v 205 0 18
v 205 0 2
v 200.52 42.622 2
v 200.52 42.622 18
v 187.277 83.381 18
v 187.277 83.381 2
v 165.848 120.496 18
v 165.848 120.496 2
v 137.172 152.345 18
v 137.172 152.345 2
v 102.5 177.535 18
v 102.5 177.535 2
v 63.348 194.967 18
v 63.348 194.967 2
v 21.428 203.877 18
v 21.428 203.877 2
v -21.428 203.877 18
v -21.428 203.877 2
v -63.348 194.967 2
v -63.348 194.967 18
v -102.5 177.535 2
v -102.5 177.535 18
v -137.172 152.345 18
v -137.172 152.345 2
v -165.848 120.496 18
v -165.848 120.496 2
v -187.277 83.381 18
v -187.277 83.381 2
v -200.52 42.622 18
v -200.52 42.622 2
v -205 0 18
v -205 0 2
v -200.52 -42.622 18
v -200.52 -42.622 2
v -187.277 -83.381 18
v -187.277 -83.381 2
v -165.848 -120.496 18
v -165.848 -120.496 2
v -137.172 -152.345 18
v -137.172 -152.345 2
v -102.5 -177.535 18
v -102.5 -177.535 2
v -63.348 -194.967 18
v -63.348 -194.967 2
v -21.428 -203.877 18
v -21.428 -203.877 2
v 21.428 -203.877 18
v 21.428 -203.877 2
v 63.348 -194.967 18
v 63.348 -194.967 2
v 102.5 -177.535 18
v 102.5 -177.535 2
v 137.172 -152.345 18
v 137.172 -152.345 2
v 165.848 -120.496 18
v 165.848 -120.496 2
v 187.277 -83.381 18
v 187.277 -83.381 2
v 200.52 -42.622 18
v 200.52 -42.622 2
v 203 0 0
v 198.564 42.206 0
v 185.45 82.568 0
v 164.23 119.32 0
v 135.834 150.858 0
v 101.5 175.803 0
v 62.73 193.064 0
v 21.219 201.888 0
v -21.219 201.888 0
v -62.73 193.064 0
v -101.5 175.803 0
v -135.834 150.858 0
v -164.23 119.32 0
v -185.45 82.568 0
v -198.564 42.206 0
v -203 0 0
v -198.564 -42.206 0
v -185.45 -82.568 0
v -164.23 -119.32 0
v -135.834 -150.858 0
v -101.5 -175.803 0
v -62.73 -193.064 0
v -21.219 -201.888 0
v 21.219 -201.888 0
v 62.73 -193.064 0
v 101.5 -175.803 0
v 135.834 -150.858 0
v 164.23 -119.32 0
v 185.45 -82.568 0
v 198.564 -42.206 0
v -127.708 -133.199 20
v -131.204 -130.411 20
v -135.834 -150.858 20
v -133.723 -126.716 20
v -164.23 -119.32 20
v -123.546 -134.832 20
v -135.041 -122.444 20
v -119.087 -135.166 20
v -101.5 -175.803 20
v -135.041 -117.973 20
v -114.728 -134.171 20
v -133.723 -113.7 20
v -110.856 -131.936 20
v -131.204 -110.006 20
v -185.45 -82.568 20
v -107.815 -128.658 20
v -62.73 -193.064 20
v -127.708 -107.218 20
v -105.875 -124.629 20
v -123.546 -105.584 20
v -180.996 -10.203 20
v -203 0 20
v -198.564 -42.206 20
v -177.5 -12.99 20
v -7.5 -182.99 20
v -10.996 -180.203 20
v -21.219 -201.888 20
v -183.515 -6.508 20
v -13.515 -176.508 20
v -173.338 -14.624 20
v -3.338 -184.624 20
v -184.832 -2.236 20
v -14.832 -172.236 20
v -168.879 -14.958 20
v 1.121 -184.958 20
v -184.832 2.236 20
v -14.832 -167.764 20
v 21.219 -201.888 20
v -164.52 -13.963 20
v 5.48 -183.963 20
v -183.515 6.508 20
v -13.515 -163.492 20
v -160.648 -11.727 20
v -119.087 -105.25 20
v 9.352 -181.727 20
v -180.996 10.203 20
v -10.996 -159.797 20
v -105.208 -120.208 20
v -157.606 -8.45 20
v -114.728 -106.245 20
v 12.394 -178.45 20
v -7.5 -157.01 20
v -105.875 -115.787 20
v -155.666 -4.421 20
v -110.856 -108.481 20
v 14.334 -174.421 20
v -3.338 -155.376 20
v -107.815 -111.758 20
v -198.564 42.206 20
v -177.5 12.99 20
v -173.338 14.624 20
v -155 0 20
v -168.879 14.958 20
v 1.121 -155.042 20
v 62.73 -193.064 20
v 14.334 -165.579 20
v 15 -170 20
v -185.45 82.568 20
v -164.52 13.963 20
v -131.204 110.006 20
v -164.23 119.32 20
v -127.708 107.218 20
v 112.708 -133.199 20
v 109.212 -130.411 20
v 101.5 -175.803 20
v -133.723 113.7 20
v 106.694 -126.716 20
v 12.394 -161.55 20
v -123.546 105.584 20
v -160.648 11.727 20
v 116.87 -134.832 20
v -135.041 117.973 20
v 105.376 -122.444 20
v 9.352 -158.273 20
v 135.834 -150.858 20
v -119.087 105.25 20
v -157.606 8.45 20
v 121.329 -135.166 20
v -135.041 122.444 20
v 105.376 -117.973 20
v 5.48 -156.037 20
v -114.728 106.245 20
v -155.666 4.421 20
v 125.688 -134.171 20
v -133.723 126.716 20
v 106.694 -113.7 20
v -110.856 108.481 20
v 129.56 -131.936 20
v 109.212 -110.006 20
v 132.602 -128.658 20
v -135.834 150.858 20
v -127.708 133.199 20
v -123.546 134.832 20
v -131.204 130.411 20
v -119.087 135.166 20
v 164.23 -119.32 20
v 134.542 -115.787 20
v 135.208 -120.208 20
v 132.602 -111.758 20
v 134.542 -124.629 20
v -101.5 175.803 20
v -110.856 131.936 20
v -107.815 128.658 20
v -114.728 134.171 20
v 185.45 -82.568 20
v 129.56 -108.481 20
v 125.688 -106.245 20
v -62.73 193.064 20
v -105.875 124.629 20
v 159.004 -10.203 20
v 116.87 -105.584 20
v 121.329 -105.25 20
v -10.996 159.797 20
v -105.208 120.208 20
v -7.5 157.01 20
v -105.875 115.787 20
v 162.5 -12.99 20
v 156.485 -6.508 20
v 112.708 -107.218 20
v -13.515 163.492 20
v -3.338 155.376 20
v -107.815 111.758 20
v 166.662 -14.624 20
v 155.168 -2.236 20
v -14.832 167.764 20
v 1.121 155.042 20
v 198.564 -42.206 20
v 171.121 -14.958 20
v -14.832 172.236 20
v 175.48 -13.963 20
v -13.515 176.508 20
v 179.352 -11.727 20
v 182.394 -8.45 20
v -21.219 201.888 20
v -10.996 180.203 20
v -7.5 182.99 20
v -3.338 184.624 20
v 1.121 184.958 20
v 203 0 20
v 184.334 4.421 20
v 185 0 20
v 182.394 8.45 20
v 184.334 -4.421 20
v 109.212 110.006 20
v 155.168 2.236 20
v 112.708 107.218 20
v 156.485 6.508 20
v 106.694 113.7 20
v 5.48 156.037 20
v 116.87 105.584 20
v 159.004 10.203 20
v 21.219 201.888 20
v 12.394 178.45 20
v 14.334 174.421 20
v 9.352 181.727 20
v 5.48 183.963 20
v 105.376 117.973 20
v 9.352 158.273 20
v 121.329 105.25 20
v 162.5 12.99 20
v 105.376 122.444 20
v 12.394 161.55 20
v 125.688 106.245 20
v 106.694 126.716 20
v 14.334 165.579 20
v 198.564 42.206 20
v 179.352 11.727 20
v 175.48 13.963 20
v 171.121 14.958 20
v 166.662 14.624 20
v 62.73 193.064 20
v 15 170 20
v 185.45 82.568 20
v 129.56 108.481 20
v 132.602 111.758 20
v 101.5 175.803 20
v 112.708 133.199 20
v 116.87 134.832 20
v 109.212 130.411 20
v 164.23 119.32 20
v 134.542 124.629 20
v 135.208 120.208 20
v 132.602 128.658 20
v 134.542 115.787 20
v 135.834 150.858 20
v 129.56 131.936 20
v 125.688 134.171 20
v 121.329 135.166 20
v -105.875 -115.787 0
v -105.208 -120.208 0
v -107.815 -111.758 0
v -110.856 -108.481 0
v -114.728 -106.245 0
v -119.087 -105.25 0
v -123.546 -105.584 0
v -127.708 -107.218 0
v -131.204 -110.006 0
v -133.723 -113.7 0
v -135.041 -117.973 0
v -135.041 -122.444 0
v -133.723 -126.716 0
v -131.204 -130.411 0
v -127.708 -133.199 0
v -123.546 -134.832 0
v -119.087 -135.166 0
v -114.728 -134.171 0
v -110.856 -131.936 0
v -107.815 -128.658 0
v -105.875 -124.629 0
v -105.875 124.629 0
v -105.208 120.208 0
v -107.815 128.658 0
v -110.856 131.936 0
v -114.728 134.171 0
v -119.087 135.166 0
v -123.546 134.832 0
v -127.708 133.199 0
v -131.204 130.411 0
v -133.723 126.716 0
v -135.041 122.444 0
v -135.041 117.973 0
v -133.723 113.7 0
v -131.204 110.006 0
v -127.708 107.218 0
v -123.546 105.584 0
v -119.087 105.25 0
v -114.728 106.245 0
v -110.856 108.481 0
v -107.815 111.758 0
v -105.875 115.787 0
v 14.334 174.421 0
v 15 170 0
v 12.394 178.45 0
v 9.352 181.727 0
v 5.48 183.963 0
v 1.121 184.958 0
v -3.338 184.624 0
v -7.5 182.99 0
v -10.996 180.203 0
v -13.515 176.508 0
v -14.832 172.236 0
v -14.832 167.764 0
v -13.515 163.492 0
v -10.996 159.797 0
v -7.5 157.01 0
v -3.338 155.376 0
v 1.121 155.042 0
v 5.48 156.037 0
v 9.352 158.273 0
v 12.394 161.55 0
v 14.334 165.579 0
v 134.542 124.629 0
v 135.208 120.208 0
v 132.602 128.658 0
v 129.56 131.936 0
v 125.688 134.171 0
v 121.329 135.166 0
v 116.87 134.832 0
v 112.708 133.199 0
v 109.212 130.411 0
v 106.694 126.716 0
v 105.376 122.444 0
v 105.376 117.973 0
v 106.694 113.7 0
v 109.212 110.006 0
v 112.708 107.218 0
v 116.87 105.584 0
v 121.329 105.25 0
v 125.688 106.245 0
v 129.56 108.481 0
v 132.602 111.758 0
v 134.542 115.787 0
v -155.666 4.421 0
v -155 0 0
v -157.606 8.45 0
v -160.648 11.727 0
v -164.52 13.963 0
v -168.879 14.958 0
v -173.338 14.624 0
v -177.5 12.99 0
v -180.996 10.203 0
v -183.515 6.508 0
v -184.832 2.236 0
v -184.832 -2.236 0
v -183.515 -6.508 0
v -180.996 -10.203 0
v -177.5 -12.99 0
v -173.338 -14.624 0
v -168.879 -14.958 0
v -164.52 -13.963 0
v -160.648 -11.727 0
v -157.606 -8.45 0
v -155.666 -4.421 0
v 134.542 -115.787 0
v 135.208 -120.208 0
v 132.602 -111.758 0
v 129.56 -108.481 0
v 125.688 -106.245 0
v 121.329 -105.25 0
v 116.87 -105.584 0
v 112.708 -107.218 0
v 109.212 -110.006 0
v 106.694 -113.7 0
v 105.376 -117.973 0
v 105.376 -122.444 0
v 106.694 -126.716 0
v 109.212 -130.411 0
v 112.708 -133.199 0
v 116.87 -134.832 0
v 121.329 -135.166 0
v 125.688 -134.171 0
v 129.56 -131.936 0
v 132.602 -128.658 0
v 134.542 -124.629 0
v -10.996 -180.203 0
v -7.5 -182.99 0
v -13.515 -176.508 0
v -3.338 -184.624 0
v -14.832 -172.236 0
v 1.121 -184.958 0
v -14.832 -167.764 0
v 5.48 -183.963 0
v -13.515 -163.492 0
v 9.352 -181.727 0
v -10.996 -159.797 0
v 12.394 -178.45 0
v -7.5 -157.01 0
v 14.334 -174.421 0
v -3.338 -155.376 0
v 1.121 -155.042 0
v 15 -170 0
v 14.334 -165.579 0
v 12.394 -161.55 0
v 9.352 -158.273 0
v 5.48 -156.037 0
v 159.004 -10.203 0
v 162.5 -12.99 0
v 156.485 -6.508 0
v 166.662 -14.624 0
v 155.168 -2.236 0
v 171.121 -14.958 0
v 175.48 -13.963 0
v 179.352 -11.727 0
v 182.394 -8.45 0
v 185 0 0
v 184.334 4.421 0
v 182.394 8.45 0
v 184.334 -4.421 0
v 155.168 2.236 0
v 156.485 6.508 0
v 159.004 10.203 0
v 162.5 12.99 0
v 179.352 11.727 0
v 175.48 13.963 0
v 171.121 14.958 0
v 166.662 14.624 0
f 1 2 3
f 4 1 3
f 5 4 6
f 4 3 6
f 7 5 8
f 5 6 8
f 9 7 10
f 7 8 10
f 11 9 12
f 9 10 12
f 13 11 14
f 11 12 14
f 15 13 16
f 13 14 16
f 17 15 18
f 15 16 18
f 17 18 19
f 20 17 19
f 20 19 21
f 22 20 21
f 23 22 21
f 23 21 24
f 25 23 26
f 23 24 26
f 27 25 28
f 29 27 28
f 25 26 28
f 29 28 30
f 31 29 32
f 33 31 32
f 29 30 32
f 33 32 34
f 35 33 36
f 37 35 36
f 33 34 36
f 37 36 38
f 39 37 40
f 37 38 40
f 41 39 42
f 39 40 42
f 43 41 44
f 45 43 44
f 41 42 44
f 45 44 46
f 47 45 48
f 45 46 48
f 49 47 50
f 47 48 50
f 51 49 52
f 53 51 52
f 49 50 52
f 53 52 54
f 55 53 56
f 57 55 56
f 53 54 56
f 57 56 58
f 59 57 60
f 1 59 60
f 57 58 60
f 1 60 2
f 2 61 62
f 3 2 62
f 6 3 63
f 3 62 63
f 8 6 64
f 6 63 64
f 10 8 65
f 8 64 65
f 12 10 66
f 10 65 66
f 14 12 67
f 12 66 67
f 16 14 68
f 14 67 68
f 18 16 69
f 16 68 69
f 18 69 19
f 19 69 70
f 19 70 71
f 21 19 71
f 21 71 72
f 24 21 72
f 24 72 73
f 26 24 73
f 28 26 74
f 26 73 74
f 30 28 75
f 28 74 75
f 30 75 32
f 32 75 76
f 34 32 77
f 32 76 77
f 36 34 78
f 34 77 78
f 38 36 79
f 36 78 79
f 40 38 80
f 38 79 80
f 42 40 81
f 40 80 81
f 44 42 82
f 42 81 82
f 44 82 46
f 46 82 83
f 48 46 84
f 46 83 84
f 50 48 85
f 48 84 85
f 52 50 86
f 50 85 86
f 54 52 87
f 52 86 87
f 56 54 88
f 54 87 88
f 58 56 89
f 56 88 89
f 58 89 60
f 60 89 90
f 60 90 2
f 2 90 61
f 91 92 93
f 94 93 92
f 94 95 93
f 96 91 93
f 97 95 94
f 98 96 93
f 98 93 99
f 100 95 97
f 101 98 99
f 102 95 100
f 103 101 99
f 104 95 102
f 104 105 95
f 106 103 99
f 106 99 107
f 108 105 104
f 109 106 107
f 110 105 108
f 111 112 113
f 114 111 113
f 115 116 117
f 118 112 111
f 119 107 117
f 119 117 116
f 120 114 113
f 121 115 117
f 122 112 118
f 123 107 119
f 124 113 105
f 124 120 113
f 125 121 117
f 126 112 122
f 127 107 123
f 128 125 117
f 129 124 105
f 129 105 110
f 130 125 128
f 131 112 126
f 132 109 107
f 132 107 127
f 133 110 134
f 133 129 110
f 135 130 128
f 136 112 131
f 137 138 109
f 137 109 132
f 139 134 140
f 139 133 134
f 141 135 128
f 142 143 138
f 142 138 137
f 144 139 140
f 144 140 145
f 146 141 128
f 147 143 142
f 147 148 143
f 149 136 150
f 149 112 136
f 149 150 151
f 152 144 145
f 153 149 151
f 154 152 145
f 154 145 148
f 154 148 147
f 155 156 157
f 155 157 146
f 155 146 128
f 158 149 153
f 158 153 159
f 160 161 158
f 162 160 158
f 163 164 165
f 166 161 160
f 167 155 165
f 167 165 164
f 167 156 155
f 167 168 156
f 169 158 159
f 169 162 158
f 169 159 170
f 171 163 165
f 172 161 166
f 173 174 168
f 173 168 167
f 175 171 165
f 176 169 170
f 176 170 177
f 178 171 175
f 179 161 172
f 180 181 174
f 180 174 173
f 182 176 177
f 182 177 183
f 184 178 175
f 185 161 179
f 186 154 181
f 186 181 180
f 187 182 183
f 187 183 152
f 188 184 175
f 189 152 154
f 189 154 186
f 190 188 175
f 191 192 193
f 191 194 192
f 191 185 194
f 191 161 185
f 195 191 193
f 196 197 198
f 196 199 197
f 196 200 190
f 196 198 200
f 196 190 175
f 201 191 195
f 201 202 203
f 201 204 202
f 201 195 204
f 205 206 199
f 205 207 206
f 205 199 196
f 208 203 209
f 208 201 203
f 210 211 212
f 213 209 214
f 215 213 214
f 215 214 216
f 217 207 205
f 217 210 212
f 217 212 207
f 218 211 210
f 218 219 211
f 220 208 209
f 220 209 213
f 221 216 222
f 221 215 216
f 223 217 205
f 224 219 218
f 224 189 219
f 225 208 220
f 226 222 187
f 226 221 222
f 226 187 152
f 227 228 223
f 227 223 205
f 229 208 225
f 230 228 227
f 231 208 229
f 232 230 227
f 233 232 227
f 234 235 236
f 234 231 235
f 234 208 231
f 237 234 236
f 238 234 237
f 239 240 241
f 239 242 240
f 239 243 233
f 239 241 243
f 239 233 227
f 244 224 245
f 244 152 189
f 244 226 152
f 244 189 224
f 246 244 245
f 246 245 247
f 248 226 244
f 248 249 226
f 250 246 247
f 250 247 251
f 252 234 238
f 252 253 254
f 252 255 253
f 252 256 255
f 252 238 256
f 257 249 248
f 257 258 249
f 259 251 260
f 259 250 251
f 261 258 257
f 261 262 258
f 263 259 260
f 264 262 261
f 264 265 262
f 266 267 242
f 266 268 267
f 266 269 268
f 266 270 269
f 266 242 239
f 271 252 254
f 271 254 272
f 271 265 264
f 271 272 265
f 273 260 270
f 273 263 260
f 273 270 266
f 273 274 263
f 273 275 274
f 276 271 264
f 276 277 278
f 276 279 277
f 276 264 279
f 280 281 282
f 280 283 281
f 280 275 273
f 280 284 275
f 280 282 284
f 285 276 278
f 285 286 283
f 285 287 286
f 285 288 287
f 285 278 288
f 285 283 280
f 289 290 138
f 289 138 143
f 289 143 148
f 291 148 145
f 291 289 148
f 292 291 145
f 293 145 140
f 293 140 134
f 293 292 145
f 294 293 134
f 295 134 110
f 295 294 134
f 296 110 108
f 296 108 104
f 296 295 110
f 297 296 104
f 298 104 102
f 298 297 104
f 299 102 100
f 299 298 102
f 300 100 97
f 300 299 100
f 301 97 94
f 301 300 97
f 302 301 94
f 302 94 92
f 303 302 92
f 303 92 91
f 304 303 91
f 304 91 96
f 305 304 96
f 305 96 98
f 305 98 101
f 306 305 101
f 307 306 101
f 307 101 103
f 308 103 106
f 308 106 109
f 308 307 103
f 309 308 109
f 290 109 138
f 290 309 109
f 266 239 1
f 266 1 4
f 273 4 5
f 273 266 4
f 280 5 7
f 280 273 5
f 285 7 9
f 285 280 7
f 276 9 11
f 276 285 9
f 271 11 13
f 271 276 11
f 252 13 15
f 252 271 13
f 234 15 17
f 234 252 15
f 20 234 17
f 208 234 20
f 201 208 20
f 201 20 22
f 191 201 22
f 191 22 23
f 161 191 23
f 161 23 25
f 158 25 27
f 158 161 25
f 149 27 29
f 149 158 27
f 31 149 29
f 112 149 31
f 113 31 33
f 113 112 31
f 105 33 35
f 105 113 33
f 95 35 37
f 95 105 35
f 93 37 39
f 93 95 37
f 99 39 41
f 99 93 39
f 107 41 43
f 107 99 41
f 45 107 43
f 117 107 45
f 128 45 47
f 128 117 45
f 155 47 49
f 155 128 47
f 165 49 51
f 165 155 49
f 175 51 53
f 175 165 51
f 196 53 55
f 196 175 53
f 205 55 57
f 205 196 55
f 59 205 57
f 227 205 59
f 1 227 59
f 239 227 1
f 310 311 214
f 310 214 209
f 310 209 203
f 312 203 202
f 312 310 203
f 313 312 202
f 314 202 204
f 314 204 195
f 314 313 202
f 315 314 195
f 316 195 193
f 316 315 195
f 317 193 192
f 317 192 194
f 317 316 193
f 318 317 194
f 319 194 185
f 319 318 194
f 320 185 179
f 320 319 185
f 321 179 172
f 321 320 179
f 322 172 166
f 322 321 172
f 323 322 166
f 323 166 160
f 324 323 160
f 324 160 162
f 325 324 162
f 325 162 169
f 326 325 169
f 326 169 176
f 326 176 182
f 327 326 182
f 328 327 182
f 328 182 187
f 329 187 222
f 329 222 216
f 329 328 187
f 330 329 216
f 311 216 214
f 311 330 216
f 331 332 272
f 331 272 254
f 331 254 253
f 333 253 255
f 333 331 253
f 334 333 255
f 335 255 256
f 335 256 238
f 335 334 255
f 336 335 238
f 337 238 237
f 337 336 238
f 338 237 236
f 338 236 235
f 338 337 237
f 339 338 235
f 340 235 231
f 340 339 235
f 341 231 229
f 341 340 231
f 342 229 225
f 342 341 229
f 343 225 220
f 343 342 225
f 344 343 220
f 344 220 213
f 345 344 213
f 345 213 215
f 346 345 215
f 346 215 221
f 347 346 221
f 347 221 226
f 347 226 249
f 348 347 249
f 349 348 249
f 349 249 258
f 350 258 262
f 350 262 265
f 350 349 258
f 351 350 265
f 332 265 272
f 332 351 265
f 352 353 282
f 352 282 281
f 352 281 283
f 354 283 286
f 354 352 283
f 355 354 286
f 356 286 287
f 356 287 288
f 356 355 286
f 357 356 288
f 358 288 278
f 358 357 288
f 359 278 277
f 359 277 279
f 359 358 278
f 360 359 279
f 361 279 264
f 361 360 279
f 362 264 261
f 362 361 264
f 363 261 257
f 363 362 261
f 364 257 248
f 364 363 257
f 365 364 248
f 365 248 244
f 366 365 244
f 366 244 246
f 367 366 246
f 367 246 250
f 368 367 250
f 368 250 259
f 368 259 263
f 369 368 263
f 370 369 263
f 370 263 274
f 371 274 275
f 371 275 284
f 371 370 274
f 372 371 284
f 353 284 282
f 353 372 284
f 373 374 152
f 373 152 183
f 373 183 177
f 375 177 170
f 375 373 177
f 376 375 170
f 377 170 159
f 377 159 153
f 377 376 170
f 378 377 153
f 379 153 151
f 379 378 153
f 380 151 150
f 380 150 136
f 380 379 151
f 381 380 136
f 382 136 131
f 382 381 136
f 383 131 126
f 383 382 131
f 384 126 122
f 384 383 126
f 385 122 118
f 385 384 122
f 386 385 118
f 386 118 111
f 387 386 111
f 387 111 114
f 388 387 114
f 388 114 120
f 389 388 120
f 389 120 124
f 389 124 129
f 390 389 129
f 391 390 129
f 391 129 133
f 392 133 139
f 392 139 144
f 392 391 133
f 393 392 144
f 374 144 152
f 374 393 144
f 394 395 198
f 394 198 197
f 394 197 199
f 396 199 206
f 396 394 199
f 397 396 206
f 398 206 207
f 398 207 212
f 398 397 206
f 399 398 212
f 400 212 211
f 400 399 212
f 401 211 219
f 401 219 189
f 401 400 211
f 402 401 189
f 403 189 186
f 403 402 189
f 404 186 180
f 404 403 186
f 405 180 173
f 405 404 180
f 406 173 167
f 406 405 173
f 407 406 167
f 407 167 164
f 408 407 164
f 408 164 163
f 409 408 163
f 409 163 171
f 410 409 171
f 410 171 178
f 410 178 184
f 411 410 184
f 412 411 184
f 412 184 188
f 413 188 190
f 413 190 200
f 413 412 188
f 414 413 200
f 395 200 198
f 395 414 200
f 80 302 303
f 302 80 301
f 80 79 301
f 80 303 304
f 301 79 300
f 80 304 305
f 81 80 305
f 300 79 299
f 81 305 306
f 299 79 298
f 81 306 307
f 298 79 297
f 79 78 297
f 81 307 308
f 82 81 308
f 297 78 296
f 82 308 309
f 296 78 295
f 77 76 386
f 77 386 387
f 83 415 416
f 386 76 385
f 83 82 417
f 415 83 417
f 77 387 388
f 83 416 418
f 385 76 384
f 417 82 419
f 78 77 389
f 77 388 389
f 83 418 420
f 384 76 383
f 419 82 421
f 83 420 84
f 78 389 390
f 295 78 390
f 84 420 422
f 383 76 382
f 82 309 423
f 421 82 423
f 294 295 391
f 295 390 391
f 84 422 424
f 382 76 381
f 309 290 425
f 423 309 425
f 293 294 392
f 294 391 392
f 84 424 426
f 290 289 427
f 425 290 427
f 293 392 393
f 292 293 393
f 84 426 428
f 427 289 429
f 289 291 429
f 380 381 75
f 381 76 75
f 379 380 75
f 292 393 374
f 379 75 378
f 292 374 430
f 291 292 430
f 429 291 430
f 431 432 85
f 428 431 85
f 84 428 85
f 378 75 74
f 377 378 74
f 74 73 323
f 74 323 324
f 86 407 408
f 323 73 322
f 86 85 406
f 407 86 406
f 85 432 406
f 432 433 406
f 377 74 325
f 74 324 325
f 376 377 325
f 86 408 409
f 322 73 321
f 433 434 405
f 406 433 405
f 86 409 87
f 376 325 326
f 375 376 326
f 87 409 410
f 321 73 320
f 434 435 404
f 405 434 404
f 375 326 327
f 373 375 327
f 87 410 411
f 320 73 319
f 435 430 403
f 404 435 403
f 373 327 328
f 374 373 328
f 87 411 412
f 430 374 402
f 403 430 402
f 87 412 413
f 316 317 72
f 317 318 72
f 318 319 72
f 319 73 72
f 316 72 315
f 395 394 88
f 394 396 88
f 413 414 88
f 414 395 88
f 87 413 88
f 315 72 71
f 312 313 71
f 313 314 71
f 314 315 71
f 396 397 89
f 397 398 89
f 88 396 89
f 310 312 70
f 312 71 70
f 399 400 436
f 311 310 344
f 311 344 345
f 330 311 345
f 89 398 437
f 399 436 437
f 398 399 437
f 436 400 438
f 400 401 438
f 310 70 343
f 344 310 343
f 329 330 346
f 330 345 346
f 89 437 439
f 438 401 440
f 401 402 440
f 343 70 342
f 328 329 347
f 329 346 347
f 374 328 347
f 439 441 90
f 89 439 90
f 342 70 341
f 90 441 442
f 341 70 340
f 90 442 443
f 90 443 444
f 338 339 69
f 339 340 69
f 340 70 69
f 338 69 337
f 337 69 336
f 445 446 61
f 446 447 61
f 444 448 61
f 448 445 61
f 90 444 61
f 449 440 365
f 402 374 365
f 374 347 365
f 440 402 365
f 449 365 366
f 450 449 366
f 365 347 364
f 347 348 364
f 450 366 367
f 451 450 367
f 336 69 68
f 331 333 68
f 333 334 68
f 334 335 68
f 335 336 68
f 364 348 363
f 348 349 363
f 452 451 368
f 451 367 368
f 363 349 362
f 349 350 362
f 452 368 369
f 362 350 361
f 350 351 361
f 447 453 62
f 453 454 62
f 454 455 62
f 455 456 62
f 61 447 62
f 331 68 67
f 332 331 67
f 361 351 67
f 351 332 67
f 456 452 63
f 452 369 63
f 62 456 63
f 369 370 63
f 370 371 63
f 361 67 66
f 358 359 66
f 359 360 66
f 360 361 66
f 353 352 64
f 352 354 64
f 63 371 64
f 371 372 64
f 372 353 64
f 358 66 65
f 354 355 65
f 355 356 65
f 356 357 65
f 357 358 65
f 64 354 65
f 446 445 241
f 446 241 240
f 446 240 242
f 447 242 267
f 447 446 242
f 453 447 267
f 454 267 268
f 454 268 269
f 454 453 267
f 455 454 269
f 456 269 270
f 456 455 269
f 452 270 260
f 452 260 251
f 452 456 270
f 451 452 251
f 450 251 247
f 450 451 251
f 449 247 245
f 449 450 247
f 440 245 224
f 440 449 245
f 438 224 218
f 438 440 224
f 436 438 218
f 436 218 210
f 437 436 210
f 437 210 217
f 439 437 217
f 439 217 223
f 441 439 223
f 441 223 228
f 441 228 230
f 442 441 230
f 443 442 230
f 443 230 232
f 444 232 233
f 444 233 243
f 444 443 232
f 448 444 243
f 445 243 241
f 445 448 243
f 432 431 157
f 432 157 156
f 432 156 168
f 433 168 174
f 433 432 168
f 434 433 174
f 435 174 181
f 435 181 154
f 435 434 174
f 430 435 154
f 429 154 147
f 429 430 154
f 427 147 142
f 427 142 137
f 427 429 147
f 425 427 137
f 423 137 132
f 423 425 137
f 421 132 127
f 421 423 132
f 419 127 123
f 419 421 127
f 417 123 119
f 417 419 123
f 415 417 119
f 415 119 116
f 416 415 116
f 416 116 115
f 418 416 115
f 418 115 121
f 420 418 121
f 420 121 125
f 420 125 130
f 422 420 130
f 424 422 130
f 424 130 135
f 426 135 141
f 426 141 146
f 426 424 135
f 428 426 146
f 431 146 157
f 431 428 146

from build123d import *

# Parameters (mm, degrees)
SKETCH1_R           = 205
SKETCH1_R_2         = 15
BOSS_EXTRUDE1_DEPTH = 20
CHAMFER1_SIZE       = 2


with BuildPart() as part:
    # Sketch1 → Boss-Extrude1 (new body)
    with BuildSketch(Plane.XY):
        Circle(SKETCH1_R)
        with Locations((0, 170)):
            Circle(SKETCH1_R_2, mode=Mode.SUBTRACT)
        with Locations((120.208152802, 120.208152802)):
            Circle(SKETCH1_R_2, mode=Mode.SUBTRACT)
        with Locations((170, 0)):
            Circle(SKETCH1_R_2, mode=Mode.SUBTRACT)
        with Locations((120.208152802, -120.208152802)):
            Circle(SKETCH1_R_2, mode=Mode.SUBTRACT)
        with Locations((0, -170)):
            Circle(SKETCH1_R_2, mode=Mode.SUBTRACT)
        with Locations((-120.208152802, -120.208152802)):
            Circle(SKETCH1_R_2, mode=Mode.SUBTRACT)
        with Locations((-170, 0)):
            Circle(SKETCH1_R_2, mode=Mode.SUBTRACT)
        with Locations((-120.208152802, 120.208152802)):
            Circle(SKETCH1_R_2, mode=Mode.SUBTRACT)
    extrude(amount=BOSS_EXTRUDE1_DEPTH)

    # Chamfer1
    chamfer1_edges = [part.edges().sort_by_distance(p)[0] for p in [
        (-205, 0, 0),
        (-205, 0, 20),
    ]]
    chamfer(chamfer1_edges, length=CHAMFER1_SIZE)


solid = part.part
